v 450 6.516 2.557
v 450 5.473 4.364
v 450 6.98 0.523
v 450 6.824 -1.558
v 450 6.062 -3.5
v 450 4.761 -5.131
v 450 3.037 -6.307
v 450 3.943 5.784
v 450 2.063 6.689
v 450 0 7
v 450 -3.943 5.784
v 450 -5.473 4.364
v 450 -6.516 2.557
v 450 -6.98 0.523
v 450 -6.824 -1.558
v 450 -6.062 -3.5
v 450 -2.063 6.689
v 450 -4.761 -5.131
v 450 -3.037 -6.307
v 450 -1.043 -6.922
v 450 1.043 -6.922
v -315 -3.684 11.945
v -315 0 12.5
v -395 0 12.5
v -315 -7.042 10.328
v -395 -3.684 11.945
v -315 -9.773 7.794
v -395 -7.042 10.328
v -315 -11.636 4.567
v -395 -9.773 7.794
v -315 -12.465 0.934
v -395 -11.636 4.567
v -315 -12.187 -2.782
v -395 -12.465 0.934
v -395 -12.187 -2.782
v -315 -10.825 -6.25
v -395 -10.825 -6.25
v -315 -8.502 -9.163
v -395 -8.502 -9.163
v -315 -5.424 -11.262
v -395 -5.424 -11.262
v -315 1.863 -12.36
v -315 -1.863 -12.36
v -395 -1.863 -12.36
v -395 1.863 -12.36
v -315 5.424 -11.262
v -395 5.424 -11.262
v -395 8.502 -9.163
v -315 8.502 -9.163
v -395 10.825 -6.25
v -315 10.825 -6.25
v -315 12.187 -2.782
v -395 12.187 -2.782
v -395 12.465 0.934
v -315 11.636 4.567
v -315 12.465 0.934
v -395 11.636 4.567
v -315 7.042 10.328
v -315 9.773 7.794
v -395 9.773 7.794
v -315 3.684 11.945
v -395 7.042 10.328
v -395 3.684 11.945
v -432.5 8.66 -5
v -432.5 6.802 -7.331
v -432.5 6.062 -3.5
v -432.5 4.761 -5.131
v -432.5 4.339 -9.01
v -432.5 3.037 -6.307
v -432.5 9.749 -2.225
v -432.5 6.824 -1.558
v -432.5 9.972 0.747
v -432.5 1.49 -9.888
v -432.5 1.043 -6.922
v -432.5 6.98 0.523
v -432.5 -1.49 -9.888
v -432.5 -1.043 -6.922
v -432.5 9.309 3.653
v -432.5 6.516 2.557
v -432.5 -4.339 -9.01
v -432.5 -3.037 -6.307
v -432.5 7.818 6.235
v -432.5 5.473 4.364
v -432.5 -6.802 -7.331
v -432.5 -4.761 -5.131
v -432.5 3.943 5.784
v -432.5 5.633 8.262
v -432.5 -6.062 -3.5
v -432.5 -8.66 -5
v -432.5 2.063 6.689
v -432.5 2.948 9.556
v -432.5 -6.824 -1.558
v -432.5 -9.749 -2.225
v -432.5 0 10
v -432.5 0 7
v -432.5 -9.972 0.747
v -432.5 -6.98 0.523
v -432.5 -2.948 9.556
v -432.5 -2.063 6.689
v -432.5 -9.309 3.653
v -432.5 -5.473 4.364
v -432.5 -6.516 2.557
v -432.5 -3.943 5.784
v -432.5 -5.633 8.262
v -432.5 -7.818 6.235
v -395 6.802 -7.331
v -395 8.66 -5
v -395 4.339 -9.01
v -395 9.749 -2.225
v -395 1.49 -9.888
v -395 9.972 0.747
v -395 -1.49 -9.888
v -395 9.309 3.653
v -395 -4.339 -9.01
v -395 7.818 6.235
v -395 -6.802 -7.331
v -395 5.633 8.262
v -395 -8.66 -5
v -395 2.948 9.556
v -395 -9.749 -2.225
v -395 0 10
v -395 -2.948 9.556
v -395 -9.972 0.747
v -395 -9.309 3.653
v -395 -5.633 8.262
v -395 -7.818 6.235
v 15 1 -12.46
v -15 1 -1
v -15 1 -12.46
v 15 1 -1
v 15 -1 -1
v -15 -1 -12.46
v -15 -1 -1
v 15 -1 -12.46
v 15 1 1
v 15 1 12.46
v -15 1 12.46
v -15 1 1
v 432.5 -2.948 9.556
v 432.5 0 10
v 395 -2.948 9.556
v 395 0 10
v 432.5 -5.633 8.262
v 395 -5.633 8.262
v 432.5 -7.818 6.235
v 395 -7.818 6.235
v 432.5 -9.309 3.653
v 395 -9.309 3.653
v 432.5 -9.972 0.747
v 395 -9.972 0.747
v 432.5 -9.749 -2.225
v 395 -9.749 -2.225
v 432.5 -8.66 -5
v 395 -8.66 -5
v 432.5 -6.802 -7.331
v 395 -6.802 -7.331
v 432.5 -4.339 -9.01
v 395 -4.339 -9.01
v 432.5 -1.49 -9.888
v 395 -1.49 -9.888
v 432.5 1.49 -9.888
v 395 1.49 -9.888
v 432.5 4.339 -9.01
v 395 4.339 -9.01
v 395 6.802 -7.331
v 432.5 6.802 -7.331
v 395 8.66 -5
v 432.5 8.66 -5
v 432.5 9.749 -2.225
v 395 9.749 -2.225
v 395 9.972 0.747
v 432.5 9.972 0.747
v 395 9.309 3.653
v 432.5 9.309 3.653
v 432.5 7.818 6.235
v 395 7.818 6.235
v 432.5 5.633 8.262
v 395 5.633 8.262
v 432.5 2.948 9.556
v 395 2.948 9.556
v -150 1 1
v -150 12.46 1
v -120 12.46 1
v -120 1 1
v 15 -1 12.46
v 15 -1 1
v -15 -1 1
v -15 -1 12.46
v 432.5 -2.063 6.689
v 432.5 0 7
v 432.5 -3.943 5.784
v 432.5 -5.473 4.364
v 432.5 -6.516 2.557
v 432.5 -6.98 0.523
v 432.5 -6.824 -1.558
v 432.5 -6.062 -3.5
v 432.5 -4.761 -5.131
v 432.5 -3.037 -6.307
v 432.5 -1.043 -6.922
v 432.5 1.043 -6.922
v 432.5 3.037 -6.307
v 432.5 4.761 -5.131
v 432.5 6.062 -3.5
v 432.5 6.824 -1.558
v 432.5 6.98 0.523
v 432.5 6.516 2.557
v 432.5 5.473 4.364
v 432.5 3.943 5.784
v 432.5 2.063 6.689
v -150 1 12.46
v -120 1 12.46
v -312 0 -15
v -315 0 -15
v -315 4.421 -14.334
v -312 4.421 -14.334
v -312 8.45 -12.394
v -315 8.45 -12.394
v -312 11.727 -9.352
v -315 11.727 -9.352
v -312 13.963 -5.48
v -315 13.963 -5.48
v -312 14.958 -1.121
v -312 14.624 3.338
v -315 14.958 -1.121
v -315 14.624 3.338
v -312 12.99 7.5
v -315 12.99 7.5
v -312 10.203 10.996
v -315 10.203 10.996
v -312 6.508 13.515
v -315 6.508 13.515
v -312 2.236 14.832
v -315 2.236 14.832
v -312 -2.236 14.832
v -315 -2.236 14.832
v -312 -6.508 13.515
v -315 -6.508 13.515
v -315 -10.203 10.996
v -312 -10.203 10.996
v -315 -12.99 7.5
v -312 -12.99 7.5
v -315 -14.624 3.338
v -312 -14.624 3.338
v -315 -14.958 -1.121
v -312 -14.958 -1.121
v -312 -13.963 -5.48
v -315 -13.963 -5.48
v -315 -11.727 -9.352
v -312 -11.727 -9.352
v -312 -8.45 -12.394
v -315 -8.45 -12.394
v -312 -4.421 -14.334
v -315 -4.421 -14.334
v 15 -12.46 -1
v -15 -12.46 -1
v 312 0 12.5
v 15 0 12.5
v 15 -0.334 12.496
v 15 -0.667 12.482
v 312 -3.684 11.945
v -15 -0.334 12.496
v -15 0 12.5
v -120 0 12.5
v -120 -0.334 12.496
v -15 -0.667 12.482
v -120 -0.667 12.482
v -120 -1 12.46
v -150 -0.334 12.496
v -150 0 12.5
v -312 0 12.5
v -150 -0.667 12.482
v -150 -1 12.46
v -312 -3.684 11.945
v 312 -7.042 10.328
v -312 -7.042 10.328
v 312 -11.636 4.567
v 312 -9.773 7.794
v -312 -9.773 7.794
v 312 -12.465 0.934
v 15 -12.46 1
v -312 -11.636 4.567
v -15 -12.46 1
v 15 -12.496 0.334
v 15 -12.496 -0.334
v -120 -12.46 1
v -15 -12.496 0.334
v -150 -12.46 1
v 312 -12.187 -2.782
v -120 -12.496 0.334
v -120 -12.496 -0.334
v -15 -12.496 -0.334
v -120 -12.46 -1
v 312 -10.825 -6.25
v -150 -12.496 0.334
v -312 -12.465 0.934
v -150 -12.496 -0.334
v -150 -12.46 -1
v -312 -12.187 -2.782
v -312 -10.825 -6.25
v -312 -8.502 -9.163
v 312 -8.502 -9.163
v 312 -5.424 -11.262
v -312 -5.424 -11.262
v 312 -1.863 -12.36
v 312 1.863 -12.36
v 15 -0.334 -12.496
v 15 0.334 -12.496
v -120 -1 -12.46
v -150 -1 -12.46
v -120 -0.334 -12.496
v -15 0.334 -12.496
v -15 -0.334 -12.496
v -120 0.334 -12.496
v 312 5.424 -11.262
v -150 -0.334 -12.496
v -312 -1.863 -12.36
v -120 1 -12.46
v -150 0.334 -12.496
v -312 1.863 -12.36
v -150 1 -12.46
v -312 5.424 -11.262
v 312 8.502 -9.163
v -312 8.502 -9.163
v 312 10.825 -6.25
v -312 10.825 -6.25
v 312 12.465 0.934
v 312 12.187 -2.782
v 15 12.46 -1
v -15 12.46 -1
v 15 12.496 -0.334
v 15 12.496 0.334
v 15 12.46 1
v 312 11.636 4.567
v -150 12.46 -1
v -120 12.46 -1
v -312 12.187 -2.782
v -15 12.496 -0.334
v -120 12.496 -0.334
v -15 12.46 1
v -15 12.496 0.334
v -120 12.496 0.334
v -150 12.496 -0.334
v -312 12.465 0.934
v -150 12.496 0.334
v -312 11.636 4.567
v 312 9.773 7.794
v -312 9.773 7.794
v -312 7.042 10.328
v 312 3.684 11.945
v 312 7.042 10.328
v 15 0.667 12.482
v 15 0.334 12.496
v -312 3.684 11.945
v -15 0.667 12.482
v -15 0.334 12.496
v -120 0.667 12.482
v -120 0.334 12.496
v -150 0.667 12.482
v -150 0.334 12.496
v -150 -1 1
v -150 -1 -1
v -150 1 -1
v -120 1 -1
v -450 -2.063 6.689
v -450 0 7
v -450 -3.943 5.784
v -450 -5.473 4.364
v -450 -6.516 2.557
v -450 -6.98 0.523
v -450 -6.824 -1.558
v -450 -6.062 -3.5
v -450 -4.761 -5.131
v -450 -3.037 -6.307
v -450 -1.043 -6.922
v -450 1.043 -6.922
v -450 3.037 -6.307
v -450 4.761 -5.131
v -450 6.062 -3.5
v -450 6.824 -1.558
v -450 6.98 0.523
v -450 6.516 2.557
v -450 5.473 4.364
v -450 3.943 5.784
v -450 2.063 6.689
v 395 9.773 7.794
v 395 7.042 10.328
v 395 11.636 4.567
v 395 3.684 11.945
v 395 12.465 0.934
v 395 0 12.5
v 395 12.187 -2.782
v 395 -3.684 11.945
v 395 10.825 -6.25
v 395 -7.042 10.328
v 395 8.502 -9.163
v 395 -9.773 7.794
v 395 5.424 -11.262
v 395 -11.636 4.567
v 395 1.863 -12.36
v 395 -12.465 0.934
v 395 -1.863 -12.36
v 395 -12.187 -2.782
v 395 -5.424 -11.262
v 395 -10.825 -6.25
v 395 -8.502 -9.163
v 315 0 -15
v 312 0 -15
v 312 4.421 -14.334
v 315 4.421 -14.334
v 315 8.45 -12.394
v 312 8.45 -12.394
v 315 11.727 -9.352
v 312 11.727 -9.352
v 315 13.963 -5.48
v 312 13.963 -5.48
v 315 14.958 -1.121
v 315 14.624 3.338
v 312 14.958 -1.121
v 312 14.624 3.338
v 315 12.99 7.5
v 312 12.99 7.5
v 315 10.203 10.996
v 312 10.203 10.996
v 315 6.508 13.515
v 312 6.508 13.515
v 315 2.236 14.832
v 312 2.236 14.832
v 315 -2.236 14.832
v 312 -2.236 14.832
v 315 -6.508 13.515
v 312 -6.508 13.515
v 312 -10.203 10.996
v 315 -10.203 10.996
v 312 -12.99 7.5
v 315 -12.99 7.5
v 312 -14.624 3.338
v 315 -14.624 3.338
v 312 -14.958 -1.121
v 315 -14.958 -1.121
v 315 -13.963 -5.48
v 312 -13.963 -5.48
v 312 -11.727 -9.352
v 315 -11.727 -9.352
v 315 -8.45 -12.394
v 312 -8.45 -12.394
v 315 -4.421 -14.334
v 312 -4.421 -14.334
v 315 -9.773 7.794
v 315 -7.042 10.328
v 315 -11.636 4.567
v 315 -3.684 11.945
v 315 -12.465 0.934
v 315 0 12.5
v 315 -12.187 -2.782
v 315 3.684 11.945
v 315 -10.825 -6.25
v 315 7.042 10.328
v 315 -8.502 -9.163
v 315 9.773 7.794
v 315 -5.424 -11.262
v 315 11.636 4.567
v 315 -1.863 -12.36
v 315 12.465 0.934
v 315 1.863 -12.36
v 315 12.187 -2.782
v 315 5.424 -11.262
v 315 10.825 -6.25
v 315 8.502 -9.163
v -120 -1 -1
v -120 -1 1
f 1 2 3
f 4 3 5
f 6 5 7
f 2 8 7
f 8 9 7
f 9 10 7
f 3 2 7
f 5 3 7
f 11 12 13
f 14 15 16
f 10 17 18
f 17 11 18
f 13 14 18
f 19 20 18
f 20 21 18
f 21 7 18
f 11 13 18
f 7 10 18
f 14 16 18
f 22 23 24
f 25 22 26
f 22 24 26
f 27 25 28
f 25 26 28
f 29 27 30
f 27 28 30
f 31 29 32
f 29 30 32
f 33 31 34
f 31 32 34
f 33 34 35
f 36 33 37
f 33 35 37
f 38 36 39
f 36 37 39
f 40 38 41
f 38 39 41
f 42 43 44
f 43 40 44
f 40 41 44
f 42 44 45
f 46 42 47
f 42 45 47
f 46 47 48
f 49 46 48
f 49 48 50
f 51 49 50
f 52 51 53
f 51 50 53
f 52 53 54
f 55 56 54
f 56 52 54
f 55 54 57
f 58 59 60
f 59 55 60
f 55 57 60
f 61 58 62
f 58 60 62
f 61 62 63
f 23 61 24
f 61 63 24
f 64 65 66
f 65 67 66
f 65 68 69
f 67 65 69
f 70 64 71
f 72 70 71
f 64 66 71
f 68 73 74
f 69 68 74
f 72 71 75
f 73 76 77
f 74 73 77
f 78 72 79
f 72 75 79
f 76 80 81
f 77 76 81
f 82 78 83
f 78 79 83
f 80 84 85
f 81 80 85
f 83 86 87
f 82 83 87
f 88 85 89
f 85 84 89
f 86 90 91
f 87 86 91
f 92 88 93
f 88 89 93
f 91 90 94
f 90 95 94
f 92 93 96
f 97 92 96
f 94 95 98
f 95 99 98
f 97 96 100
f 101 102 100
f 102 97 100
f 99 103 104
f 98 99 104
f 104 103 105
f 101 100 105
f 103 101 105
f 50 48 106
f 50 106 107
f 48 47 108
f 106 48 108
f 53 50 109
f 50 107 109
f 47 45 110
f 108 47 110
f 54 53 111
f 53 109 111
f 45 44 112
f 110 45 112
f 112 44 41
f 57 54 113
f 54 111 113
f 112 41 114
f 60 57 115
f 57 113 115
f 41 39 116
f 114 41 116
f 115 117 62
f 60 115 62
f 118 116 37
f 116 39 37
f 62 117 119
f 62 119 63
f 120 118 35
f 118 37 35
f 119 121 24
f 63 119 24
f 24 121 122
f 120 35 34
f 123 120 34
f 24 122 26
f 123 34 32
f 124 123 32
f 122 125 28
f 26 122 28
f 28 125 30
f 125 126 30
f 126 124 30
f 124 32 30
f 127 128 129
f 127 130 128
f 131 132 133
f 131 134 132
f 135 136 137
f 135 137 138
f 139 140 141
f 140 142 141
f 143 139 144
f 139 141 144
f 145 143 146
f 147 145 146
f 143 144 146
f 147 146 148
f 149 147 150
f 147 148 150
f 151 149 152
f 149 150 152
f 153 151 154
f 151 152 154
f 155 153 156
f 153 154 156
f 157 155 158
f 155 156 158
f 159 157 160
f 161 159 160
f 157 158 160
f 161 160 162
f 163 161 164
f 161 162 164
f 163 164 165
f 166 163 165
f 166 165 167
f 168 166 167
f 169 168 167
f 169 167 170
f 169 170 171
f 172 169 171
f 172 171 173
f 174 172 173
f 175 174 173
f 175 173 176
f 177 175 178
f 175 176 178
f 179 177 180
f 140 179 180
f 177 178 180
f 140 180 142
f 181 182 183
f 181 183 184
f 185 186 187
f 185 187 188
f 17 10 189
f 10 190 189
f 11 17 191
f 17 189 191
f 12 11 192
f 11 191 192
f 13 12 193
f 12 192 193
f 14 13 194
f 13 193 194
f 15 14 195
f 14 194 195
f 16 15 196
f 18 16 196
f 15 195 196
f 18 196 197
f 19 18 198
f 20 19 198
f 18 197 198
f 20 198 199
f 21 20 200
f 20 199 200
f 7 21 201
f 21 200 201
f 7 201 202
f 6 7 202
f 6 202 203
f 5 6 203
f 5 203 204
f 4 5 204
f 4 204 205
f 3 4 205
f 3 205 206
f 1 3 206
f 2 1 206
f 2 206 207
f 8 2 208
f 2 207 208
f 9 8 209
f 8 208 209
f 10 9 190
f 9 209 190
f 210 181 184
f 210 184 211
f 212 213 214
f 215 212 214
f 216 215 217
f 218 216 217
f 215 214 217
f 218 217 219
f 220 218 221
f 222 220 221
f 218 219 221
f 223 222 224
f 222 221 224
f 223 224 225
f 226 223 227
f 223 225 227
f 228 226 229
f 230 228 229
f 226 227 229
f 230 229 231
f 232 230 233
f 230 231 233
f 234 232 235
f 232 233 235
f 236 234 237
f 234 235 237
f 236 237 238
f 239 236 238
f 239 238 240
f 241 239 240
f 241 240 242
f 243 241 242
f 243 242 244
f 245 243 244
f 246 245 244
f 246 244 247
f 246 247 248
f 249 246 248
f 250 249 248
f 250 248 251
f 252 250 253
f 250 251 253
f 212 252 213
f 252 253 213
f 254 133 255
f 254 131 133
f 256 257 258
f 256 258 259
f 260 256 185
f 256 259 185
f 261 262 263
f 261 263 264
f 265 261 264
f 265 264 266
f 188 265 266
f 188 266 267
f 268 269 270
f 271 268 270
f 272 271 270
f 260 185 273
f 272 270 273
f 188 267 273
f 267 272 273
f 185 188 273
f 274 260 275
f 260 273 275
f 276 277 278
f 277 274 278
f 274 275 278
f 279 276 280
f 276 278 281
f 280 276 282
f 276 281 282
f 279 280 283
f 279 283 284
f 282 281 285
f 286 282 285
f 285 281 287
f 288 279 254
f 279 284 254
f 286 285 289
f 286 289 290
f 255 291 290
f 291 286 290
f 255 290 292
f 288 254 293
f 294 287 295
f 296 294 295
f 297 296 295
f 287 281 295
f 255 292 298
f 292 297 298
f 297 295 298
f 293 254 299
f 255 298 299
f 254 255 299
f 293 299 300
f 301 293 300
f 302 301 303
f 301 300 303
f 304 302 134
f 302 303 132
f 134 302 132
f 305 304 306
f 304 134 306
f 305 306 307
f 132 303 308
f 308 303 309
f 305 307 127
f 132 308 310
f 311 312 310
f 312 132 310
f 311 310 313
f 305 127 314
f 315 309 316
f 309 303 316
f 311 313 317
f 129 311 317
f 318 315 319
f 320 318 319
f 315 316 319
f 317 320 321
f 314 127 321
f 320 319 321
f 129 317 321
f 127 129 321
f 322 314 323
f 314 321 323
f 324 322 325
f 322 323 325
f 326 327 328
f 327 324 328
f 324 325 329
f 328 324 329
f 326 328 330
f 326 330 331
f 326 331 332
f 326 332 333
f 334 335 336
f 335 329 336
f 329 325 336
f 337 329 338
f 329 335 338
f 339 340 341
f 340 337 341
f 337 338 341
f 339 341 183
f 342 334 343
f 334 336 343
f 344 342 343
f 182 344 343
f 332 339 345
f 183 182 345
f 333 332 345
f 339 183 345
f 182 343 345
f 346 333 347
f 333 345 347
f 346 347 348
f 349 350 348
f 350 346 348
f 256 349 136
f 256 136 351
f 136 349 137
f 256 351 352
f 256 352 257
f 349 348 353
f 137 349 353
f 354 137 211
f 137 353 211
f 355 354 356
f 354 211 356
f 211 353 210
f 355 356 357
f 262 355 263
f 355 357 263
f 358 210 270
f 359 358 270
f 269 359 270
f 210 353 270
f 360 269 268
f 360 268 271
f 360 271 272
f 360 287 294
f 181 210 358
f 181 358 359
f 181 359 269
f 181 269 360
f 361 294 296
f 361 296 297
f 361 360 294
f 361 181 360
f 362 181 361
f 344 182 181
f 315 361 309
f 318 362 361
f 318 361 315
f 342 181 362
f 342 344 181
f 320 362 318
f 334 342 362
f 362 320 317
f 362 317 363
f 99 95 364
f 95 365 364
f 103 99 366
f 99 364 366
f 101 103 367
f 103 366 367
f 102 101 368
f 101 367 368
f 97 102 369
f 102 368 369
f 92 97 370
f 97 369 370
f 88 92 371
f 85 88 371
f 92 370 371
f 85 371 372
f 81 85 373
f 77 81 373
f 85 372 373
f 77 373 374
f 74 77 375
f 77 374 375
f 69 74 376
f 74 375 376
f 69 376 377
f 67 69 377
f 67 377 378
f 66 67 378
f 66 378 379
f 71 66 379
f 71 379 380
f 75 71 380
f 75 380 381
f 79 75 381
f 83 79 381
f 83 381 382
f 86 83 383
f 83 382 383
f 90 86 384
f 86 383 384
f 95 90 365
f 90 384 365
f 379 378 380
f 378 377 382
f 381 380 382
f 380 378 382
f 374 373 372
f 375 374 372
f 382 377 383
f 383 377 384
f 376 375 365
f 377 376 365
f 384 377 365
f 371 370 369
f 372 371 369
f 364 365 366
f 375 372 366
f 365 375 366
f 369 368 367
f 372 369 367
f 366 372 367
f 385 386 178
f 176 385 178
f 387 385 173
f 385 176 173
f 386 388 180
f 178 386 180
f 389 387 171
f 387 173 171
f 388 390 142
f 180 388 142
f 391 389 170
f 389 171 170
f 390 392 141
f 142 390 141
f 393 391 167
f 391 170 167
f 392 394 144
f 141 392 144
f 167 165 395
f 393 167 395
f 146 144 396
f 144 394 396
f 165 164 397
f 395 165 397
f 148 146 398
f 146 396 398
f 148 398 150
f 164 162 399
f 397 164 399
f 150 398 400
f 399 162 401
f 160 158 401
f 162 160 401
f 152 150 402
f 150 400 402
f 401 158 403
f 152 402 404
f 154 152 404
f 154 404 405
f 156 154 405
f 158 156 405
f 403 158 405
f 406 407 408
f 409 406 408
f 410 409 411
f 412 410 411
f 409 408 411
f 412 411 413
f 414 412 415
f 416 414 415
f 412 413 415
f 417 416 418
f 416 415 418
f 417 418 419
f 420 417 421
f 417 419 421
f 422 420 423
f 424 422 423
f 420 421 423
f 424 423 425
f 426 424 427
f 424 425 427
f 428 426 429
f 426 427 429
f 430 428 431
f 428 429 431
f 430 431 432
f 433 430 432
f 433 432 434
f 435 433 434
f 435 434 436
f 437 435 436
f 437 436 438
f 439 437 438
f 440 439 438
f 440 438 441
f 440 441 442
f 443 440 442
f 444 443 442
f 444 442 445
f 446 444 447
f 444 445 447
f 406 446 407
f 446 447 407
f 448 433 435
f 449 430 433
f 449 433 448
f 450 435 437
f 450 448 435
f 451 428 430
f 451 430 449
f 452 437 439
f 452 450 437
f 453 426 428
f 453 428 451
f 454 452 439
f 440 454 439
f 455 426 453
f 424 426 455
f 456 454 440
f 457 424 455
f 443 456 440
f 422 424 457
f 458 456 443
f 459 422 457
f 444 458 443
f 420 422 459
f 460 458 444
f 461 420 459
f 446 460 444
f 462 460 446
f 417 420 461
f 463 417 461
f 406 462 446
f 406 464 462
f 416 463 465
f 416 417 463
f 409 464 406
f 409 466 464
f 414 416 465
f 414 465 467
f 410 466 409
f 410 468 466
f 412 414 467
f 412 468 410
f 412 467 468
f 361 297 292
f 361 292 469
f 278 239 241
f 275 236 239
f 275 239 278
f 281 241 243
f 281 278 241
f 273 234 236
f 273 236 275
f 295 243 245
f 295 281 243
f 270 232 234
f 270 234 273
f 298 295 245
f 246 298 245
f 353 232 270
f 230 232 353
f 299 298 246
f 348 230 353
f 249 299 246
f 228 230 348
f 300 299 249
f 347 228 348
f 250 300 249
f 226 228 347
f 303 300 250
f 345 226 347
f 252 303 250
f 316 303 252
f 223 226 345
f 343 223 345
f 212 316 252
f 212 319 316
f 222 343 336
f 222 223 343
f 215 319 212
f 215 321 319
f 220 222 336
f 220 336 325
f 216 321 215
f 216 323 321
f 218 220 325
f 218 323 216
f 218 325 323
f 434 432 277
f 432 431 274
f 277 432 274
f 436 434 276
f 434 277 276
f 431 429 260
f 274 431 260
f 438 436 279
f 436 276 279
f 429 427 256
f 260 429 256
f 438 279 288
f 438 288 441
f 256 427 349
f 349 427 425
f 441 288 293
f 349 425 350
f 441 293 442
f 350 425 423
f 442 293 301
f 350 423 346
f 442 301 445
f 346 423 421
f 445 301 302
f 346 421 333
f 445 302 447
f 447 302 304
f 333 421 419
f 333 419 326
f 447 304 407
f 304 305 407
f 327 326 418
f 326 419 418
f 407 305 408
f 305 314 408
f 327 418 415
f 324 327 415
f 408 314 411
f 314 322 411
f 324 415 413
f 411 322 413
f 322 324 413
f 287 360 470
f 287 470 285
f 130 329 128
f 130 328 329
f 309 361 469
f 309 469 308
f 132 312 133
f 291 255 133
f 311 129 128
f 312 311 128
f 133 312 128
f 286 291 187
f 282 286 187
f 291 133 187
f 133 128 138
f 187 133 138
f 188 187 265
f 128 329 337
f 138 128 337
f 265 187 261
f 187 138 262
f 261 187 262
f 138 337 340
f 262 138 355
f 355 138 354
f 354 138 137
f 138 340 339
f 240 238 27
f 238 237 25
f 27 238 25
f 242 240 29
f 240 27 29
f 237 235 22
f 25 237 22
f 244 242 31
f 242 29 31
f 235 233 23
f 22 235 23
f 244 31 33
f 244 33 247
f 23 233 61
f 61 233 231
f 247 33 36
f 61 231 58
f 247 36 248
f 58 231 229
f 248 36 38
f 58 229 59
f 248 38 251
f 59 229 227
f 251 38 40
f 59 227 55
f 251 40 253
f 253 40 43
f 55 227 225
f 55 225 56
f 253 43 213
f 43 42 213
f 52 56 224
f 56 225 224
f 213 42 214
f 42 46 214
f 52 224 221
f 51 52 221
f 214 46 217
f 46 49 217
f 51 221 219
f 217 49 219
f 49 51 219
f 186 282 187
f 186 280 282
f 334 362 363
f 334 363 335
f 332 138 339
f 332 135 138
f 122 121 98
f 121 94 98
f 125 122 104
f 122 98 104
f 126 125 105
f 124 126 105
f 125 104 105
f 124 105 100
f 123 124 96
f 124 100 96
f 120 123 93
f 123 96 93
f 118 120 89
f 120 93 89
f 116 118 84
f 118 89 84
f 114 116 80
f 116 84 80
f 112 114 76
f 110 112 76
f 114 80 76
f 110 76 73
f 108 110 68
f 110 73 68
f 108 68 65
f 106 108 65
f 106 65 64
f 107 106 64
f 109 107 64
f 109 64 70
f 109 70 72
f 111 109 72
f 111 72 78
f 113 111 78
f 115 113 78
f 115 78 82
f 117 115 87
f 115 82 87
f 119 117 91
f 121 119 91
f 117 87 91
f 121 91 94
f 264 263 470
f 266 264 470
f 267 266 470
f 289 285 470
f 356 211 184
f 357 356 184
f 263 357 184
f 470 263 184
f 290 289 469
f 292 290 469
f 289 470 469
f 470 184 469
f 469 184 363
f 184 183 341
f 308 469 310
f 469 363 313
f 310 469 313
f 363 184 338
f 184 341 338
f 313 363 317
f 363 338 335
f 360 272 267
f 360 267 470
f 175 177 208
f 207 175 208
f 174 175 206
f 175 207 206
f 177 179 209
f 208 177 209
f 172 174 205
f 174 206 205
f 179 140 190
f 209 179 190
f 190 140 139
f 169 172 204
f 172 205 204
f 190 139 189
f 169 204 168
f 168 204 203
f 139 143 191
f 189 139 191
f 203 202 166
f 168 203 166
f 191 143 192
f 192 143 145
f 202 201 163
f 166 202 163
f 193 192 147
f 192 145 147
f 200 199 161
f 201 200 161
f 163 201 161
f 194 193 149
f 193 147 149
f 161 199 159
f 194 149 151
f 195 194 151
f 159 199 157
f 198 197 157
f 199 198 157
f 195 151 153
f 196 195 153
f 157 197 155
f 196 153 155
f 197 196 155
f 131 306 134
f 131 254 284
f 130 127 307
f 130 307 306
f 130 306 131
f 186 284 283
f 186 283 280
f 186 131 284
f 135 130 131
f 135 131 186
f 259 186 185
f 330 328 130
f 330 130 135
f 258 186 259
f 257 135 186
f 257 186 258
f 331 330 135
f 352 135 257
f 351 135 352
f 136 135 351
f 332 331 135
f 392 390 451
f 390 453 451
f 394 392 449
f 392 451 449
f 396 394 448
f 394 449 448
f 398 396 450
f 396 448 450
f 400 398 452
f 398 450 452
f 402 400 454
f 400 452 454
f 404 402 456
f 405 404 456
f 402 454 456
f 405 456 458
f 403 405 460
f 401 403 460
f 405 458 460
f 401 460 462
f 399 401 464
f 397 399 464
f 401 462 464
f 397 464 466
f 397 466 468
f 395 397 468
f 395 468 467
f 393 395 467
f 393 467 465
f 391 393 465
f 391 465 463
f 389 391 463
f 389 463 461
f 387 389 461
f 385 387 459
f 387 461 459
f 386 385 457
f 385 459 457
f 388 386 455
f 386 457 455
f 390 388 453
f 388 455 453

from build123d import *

# Parameters (mm, degrees)
Y_KSEKLIK_EKSTR_ZYON1_START = -315
IZIM2_R                     = 15
Y_KSEKLIK_EKSTR_ZYON1_DEPTH = 3
Y_KSEKLIK_EKSTR_ZYON2_START = 312
IZIM2_2_R                   = 15
Y_KSEKLIK_EKSTR_ZYON2_DEPTH = 3
KES_EKSTR_ZYON2_DEPTH       = 15
KES_EKSTR_ZYON3_START       = -600
KES_EKSTR_ZYON3_DEPTH       = 30


with BuildPart() as part:
    # Çizim1 → Döndür1 (revolve)
    with BuildSketch(Plane.XY):
        Polygon((450, 0), (450, 7), (432.5, 7), (432.5, 10), (395, 10), (395, 12.5), (-395, 12.5), (-395, 10), (-432.5, 10), (-432.5, 7), (-450, 7), (-450, 0), align=None)
    revolve(axis=Axis((-450, 0, 0), (1, 0, 0)))

    # Çizim2 → Yükseklik-Ekstrüzyon1 (add)
    with BuildSketch(Plane(origin=(0, 0, 0), x_dir=(0, 0, -1), z_dir=(1, 0, 0)).offset(Y_KSEKLIK_EKSTR_ZYON1_START)):
        Circle(IZIM2_R)
    extrude(amount=Y_KSEKLIK_EKSTR_ZYON1_DEPTH)

    # Çizim2<2> → Yükseklik-Ekstrüzyon2 (add)
    with BuildSketch(Plane(origin=(0, 0, 0), x_dir=(0, 0, -1), z_dir=(1, 0, 0)).offset(Y_KSEKLIK_EKSTR_ZYON2_START)):
        Circle(IZIM2_2_R)
    extrude(amount=Y_KSEKLIK_EKSTR_ZYON2_DEPTH)

    # Çizim4 → Kes-Ekstrüzyon2 (cut, symmetric)
    with BuildSketch(Plane(origin=(0, 0, 0), x_dir=(0, 0, -1), z_dir=(1, 0, 0))):
        with BuildLine():
            Line((-12.459935794, 1), (-1, 1))
            Line((-1, 1), (-1, 12.459935794))
            ThreePointArc((-1, 12.459935794), (0, 12.5), (1, 12.459935794))
            Line((1, 12.459935794), (1, 1))
            Line((1, 1), (12.459935794, 1))
            ThreePointArc((12.459935794, 1), (12.5, 0), (12.459935794, -1))
            Line((12.459935794, -1), (1, -1))
            Line((1, -1), (1, -12.459935794))
            ThreePointArc((1, -12.459935794), (0, -12.5), (-1, -12.459935794))
            Line((-1, -12.459935794), (-1, -1))
            Line((-1, -1), (-12.459935794, -1))
            ThreePointArc((-12.459935794, -1), (-12.5, 0), (-12.459935794, 1))
        make_face()
    extrude(amount=KES_EKSTR_ZYON2_DEPTH, both=True, mode=Mode.SUBTRACT)

    # Çizim6 → Kes-Ekstrüzyon3 (cut)
    with BuildSketch(Plane(origin=(450, 0, 0), x_dir=(0, 0, -1), z_dir=(1, 0, 0)).offset(KES_EKSTR_ZYON3_START)):
        with BuildLine():
            Line((1, 1), (1, 12.459935794))
            ThreePointArc((1, 12.459935794), (0, 12.5), (-1, 12.459935794))
            Line((-1, 12.459935794), (-1, 1))
            Line((-1, 1), (-12.459935794, 1))
            ThreePointArc((-12.459935794, 1), (-12.5, 0), (-12.459935794, -1))
            Line((-12.459935794, -1), (-1, -1))
            Line((-1, -1), (-1, -12.459935794))
            ThreePointArc((-1, -12.459935794), (0, -12.5), (1, -12.459935794))
            Line((1, -12.459935794), (1, -1))
            Line((1, -1), (12.459935794, -1))
            ThreePointArc((12.459935794, -1), (12.5, 0), (12.459935794, 1))
            Line((12.459935794, 1), (1, 1))
        make_face()
    extrude(amount=KES_EKSTR_ZYON3_DEPTH, mode=Mode.SUBTRACT)


solid = part.part
